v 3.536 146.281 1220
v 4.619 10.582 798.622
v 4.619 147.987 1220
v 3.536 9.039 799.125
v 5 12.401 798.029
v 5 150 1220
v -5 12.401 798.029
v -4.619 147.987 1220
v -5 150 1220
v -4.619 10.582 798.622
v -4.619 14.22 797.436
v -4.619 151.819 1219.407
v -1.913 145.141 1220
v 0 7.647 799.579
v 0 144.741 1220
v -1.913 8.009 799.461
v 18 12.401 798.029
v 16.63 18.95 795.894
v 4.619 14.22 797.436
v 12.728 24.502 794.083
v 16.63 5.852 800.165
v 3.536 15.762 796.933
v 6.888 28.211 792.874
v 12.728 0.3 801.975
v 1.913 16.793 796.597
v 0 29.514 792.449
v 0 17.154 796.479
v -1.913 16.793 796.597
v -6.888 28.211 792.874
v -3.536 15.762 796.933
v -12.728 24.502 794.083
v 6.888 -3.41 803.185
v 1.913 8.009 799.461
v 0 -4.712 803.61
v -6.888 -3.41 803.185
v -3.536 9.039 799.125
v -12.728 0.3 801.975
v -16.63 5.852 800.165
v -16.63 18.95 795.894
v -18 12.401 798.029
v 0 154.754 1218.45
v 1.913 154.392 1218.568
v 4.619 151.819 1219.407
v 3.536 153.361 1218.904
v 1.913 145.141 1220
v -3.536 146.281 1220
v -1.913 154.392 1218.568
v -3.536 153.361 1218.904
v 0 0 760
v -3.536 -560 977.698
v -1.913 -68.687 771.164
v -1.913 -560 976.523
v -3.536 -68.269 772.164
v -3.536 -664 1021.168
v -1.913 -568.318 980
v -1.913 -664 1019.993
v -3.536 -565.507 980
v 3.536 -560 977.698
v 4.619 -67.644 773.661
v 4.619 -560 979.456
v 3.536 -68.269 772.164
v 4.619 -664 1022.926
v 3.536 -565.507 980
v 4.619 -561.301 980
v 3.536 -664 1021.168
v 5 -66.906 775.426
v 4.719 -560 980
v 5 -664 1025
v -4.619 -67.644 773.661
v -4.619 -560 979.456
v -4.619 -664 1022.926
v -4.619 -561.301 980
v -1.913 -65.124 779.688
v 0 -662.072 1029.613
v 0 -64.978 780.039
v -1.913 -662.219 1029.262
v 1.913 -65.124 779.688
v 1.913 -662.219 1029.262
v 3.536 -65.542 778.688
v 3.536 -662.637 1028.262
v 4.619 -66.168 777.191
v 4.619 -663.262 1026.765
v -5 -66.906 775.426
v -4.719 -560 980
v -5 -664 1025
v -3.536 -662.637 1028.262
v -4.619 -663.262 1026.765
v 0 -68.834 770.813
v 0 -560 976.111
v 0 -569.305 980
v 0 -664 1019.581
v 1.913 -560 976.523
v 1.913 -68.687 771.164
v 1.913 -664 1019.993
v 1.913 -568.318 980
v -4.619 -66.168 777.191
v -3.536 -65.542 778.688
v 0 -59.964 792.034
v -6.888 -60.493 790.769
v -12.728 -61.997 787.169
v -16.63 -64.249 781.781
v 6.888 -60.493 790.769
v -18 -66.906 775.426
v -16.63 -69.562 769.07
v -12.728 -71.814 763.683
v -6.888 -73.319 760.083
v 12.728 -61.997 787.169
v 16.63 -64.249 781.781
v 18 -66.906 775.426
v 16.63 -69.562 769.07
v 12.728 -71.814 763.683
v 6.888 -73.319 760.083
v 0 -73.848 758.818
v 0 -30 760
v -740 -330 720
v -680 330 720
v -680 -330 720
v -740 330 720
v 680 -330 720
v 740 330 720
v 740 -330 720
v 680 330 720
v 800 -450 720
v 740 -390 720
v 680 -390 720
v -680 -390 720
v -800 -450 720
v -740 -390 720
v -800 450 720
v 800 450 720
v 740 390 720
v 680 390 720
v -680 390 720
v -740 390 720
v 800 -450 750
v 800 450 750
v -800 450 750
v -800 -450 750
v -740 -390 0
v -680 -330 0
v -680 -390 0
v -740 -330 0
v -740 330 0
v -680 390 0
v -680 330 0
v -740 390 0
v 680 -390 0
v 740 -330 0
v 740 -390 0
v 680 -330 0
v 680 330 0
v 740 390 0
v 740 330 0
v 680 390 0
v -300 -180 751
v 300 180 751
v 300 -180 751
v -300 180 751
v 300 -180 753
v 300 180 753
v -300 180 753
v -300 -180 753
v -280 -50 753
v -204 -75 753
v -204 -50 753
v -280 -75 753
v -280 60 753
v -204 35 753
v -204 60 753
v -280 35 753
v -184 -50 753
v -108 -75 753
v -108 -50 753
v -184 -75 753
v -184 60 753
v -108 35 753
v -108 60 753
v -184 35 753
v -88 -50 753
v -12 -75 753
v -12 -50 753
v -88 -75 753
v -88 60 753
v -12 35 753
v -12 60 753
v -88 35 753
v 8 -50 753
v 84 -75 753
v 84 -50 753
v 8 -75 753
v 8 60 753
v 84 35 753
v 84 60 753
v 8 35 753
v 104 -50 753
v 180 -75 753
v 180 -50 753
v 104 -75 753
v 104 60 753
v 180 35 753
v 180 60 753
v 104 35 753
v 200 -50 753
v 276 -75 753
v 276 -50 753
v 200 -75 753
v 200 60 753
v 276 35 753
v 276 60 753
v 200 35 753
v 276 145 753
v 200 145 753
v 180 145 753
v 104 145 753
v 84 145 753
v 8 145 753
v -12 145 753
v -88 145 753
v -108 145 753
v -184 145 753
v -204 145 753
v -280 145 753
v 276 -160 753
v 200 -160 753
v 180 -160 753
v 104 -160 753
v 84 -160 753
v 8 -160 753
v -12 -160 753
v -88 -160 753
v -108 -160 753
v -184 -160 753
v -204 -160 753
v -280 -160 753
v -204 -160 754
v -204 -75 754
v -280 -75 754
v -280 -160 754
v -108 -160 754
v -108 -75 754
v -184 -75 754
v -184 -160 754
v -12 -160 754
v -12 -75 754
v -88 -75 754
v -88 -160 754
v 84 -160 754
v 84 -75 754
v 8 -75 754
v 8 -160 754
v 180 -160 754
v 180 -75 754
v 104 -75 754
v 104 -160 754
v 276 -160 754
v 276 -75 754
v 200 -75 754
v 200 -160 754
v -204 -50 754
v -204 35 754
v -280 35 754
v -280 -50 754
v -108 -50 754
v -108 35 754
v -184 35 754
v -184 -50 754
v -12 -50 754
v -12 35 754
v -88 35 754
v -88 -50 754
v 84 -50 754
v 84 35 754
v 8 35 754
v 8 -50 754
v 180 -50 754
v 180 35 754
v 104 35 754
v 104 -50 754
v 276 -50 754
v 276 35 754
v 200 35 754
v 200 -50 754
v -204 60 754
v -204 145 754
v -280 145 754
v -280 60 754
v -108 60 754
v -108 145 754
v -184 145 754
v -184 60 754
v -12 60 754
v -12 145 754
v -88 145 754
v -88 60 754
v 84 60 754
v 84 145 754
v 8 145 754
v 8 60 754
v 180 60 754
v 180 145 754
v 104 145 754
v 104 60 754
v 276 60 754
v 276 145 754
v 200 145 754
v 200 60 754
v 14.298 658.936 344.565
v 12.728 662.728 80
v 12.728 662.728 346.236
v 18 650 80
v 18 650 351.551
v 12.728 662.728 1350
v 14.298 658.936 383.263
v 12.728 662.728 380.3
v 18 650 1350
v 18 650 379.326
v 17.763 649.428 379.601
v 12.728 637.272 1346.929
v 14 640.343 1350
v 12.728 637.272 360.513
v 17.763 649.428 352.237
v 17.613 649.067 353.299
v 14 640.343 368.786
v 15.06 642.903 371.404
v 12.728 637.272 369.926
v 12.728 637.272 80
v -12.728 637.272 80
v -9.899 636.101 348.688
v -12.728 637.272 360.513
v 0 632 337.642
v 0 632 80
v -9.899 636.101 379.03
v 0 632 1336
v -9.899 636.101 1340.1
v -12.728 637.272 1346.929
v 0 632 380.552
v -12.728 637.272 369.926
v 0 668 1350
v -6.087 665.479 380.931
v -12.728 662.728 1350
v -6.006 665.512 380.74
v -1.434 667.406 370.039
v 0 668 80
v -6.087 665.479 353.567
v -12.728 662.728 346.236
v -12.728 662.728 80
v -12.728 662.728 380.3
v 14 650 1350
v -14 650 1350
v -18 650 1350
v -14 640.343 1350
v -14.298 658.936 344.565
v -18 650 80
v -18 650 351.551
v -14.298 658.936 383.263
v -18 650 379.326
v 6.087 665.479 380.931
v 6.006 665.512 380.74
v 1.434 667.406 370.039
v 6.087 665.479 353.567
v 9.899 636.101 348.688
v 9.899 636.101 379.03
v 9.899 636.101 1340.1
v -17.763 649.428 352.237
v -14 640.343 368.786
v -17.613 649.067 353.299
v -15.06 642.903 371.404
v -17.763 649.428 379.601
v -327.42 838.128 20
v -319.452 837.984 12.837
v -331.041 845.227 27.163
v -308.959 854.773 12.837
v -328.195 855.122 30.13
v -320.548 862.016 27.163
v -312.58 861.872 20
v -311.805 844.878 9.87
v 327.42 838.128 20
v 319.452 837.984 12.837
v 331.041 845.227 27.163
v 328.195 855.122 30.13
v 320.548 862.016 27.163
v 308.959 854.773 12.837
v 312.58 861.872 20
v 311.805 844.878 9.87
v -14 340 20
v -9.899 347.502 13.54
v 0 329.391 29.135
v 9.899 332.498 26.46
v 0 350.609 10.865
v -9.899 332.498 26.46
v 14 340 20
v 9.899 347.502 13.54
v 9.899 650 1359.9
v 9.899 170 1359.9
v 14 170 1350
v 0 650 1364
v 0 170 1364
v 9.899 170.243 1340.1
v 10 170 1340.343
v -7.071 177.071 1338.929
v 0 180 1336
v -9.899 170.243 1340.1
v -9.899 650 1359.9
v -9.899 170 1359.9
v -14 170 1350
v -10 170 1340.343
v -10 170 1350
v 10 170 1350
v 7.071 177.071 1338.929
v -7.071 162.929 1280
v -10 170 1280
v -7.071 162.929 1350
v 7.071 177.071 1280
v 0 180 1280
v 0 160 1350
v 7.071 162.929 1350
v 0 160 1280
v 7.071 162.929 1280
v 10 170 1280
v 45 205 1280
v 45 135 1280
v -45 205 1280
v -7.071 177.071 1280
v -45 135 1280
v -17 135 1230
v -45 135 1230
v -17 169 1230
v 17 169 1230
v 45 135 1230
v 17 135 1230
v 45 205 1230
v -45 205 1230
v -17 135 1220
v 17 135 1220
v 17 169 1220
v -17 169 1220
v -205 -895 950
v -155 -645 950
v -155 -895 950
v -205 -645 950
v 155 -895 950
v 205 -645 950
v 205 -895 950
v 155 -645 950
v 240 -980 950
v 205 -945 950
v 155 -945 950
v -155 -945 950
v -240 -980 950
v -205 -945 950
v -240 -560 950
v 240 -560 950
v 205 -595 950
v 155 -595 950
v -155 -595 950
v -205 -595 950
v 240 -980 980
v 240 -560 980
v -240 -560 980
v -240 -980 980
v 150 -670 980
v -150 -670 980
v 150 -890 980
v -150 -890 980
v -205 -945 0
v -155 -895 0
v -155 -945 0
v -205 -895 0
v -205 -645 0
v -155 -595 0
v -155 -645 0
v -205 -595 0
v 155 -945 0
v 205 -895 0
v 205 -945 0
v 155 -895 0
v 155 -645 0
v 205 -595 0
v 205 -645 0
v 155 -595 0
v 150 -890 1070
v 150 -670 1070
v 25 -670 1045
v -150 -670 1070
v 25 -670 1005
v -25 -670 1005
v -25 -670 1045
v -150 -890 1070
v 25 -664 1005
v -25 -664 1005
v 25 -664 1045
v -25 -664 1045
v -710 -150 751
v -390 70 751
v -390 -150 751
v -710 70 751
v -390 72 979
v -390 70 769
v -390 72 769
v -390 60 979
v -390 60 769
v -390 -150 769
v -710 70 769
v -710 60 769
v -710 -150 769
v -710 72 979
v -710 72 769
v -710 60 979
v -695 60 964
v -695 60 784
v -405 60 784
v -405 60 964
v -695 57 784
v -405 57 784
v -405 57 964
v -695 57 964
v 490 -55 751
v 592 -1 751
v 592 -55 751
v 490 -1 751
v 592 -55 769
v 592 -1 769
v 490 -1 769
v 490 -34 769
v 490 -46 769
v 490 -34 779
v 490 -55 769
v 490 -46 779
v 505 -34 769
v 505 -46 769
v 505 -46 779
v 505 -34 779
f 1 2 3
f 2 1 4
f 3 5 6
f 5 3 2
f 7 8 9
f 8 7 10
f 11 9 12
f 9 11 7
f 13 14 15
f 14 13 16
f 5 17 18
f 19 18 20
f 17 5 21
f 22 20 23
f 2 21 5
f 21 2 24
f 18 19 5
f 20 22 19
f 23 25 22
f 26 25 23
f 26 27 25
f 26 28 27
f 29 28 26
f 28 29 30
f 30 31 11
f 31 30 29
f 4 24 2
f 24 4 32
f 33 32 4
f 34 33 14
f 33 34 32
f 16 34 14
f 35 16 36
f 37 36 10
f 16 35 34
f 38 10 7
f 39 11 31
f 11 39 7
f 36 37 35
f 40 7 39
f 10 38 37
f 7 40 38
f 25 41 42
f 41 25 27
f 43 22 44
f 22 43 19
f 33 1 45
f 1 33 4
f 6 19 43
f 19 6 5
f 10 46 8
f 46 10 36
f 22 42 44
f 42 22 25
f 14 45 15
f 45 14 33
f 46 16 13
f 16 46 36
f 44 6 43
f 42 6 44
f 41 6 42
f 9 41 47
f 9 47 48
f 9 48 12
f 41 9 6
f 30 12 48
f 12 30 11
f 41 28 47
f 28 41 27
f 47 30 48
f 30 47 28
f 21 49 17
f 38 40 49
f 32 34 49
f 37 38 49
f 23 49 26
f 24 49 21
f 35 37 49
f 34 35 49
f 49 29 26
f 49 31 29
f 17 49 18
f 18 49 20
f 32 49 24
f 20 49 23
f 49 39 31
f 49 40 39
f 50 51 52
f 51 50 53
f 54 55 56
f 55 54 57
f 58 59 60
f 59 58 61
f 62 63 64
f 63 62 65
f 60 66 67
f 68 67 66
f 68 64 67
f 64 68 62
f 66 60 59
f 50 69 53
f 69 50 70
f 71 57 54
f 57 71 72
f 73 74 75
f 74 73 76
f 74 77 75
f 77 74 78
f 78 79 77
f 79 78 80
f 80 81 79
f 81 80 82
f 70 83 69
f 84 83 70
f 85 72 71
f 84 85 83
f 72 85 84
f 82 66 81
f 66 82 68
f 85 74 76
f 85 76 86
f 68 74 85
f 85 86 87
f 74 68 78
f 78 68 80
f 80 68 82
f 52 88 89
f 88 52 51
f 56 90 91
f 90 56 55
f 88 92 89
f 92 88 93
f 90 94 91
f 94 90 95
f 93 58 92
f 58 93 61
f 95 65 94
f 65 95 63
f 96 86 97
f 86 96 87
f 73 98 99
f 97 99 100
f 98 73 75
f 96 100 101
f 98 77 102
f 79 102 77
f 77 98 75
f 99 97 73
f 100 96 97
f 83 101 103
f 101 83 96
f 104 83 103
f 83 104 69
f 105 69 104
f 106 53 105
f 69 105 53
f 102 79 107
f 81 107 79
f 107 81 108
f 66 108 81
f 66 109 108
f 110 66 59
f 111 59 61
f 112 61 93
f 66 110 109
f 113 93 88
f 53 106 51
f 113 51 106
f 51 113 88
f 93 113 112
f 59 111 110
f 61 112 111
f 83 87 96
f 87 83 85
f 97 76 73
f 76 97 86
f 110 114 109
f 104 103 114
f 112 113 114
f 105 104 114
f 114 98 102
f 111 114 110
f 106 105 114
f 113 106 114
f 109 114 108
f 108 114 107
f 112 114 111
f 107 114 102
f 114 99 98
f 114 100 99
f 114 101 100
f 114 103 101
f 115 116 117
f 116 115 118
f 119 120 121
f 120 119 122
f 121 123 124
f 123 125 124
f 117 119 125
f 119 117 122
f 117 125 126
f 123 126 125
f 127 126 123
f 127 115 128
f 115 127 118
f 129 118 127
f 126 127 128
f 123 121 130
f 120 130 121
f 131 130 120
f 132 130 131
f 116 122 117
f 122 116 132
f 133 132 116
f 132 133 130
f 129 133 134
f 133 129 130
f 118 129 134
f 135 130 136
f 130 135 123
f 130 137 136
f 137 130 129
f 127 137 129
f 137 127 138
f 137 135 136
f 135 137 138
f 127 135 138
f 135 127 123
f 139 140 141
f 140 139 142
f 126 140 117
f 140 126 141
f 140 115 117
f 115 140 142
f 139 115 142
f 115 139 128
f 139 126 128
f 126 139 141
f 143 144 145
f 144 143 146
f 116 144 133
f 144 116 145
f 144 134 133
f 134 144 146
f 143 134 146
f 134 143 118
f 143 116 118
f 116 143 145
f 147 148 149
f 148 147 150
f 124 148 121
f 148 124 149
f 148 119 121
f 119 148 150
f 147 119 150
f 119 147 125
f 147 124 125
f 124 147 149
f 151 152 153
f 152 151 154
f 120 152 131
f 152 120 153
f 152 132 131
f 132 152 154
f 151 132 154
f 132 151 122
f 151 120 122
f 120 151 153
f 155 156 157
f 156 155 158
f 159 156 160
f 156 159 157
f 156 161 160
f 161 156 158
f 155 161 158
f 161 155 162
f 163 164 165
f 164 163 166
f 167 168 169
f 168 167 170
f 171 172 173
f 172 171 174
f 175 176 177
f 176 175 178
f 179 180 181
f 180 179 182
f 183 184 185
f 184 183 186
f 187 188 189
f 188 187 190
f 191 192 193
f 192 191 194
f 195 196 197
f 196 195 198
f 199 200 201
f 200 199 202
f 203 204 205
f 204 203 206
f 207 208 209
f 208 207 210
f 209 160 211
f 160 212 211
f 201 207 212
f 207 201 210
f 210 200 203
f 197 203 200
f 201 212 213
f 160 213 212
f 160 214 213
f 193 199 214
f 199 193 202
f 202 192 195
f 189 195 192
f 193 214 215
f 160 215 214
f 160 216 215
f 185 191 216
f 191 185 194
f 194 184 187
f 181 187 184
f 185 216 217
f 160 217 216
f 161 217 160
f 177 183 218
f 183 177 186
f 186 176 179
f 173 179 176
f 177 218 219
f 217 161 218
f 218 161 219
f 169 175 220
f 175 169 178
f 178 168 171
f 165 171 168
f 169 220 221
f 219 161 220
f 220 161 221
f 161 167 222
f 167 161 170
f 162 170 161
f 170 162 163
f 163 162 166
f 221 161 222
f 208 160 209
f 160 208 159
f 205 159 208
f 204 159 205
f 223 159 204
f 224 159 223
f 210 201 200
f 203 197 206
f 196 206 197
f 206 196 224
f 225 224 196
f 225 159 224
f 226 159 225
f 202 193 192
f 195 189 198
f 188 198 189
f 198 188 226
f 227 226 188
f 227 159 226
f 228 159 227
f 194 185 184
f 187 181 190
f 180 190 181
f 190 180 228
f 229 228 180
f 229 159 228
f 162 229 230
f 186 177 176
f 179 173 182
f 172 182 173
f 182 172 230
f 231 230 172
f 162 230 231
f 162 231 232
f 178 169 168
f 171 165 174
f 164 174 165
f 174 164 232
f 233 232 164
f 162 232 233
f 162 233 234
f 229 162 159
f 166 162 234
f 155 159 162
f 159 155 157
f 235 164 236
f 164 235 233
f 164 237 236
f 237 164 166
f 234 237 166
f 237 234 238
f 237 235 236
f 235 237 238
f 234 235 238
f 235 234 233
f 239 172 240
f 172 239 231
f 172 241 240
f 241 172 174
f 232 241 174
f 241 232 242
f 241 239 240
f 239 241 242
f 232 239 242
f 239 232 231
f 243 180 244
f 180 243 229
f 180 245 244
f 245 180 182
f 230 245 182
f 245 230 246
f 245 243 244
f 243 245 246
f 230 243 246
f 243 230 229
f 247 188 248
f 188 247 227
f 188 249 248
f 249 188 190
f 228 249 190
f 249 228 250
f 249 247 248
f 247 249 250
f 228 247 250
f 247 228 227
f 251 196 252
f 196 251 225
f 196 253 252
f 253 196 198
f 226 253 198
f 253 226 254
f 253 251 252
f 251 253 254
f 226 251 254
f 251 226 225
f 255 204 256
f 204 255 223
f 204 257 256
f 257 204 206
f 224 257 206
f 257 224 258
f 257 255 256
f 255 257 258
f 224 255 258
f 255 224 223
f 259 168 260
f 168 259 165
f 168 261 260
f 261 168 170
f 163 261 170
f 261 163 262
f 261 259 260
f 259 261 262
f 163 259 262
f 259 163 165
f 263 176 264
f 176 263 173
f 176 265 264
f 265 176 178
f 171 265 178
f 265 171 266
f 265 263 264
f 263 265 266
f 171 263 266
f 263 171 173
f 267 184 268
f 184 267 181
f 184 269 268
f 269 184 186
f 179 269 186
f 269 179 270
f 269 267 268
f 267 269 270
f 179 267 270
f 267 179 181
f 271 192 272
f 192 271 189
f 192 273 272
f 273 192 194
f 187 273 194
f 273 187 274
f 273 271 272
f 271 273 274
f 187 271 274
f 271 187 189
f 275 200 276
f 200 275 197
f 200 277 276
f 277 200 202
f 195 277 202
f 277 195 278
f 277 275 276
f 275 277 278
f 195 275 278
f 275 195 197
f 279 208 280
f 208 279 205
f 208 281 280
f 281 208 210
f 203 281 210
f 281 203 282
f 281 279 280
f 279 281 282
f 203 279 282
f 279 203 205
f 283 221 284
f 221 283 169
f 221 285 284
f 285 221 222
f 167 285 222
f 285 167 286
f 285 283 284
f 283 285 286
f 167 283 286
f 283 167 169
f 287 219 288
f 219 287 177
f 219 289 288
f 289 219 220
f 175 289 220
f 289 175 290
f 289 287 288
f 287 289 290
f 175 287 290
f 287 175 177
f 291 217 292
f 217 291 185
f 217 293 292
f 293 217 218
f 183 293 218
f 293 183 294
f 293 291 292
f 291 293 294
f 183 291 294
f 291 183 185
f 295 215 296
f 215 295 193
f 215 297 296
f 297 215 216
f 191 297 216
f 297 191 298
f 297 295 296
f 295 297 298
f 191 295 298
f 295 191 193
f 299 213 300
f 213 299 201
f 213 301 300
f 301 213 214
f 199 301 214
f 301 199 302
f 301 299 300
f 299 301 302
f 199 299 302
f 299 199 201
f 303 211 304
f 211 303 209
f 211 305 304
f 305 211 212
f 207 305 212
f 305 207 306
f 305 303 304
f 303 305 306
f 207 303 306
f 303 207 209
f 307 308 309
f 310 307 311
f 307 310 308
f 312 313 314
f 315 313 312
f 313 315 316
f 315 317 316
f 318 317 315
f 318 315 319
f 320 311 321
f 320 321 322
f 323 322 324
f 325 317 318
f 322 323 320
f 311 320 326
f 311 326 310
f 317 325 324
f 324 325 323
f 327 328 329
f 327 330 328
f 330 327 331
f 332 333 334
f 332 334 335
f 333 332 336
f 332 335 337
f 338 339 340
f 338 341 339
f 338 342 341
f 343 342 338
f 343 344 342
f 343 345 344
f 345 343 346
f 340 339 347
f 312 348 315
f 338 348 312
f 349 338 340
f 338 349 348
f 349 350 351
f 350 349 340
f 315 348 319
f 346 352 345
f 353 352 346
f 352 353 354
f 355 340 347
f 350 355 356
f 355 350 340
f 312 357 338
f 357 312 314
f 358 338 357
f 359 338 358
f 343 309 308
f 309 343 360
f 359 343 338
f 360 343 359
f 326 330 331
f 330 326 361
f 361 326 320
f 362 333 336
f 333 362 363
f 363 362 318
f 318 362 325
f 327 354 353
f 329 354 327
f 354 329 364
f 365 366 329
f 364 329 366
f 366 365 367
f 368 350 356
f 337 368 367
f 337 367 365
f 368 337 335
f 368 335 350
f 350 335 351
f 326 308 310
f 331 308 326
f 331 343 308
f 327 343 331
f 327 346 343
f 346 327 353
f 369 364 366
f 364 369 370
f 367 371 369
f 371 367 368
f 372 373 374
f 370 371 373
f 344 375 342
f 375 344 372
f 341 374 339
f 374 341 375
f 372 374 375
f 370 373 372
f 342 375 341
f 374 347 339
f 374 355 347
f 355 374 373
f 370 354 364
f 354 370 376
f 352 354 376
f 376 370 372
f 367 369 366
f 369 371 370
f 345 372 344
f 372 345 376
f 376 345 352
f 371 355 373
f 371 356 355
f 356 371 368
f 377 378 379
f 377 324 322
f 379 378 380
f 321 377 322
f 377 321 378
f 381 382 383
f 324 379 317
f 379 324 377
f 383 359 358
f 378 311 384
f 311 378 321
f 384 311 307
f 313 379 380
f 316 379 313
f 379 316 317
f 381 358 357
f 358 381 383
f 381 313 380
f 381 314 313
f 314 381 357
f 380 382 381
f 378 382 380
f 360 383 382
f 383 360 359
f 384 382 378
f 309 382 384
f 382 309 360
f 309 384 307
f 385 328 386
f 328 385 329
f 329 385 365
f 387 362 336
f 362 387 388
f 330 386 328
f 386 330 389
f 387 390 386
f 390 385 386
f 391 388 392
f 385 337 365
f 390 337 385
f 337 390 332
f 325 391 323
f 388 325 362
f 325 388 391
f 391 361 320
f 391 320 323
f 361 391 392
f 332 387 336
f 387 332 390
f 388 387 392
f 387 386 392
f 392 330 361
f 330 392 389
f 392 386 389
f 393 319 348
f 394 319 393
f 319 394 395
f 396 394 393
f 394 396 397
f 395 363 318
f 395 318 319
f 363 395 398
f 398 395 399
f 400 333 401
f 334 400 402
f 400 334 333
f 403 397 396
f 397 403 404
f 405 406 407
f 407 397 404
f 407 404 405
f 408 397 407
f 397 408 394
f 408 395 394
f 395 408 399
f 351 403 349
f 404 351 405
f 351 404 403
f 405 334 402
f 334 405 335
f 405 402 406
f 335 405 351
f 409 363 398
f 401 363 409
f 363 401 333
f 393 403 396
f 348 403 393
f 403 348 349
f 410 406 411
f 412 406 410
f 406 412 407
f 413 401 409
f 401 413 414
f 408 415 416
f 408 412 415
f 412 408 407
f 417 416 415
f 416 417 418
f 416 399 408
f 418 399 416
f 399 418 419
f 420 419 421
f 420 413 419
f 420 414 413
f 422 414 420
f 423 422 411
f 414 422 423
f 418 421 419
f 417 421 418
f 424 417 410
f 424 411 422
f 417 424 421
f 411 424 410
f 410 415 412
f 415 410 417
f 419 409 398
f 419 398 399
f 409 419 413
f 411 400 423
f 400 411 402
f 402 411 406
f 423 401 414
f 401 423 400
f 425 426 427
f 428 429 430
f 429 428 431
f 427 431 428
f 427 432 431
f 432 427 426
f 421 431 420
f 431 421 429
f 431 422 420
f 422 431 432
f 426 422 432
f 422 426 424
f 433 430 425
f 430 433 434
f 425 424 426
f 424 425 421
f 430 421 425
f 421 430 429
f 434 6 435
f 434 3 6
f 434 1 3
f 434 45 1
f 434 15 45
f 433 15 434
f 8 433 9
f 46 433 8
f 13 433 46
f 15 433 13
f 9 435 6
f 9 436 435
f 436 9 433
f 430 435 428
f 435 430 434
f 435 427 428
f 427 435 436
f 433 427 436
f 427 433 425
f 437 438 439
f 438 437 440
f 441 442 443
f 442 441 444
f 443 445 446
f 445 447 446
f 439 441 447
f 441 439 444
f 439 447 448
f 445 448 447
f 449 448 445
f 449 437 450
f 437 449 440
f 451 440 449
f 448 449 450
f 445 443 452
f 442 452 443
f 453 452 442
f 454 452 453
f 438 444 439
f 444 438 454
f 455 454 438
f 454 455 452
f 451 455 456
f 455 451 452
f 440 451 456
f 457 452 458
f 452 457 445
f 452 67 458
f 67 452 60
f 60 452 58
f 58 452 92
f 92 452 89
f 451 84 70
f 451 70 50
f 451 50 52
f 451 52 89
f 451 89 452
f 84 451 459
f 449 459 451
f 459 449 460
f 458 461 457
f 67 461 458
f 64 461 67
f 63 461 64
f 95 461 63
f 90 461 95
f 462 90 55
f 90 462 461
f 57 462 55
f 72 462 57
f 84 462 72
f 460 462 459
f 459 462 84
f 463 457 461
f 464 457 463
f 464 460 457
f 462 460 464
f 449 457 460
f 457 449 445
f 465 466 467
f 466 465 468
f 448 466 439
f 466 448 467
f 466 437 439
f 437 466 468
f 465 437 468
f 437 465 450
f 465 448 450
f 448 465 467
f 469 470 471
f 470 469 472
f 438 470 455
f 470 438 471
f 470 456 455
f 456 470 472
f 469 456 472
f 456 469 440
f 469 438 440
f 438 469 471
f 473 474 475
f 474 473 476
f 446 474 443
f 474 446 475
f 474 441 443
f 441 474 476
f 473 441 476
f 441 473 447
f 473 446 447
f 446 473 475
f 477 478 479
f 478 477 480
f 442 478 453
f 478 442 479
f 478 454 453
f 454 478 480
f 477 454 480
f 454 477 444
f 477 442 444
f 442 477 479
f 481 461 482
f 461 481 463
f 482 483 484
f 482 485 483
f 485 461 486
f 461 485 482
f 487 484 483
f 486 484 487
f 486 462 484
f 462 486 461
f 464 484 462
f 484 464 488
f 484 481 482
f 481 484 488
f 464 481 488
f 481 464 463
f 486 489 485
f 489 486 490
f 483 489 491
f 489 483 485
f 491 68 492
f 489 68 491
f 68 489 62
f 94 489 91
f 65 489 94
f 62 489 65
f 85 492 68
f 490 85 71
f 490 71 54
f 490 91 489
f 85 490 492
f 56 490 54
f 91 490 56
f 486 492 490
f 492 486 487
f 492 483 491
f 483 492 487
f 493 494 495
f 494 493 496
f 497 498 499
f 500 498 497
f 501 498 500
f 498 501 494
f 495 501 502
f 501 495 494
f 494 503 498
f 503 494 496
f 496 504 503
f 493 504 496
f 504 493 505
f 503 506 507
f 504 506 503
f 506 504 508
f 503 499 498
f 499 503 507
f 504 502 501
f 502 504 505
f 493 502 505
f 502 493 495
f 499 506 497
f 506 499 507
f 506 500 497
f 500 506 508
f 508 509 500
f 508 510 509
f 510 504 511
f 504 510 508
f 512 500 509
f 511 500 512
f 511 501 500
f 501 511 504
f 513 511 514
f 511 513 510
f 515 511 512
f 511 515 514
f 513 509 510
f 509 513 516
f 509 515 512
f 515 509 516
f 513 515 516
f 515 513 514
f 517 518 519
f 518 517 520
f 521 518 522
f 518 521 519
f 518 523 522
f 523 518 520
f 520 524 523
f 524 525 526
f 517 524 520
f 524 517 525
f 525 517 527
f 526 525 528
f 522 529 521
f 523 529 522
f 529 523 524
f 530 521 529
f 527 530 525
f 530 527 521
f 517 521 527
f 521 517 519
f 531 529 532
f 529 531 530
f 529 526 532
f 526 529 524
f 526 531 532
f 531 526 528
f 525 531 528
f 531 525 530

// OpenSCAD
// Concept CAD — Not Built or Validated
// Units: approximate mm. Presentation only; no manufacturing or mounting data.
// Generated with generate-concept.cjs; editable independently in OpenSCAD.
// Existing desk, standard overhead stand, existing projector support.
// No cables, physical interfaces, optical calibration, loads or clearances validated.
show_directions = true;
show_interaction_tiles = true;

// Existing desk placeholder
color([0.7372549019607844,0.6392156862745098,0.5450980392156862]) polyhedron(points=[[-800,-450,720],[800,-450,720],[800,450,720],[-800,450,720],[-800,-450,750],[800,-450,750],[800,450,750],[-800,450,750]], faces=[[1,2,3,0],[7,6,5,4],[4,5,1,0],[5,6,2,1],[6,7,3,2],[7,4,0,3]], convexity=10);

// Existing desk leg
color([0.7372549019607844,0.6392156862745098,0.5450980392156862]) polyhedron(points=[[-740,-390,0],[-680,-390,0],[-680,-330,0],[-740,-330,0],[-740,-390,720],[-680,-390,720],[-680,-330,720],[-740,-330,720]], faces=[[1,2,3,0],[7,6,5,4],[4,5,1,0],[5,6,2,1],[6,7,3,2],[7,4,0,3]], convexity=10);

// Existing desk leg
color([0.7372549019607844,0.6392156862745098,0.5450980392156862]) polyhedron(points=[[-740,330,0],[-680,330,0],[-680,390,0],[-740,390,0],[-740,330,720],[-680,330,720],[-680,390,720],[-740,390,720]], faces=[[1,2,3,0],[7,6,5,4],[4,5,1,0],[5,6,2,1],[6,7,3,2],[7,4,0,3]], convexity=10);

// Existing desk leg
color([0.7372549019607844,0.6392156862745098,0.5450980392156862]) polyhedron(points=[[680,-390,0],[740,-390,0],[740,-330,0],[680,-330,0],[680,-390,720],[740,-390,720],[740,-330,720],[680,-330,720]], faces=[[1,2,3,0],[7,6,5,4],[4,5,1,0],[5,6,2,1],[6,7,3,2],[7,4,0,3]], convexity=10);

// Existing desk leg
color([0.7372549019607844,0.6392156862745098,0.5450980392156862]) polyhedron(points=[[680,330,0],[740,330,0],[740,390,0],[680,390,0],[680,330,720],[740,330,720],[740,390,720],[680,390,720]], faces=[[1,2,3,0],[7,6,5,4],[4,5,1,0],[5,6,2,1],[6,7,3,2],[7,4,0,3]], convexity=10);

// Projected interaction area
color([0.8823529411764706,0.7411764705882353,0.28627450980392155]) polyhedron(points=[[-300,-180,751],[300,-180,751],[300,180,751],[-300,180,751],[-300,-180,753],[300,-180,753],[300,180,753],[-300,180,753]], faces=[[1,2,3,0],[7,6,5,4],[4,5,1,0],[5,6,2,1],[6,7,3,2],[7,4,0,3]], convexity=10);

// Illustrative projected card
if (show_interaction_tiles) color([0.9725490196078431,0.9294117647058824,0.7686274509803922]) polyhedron(points=[[-280,-160,753],[-204,-160,753],[-204,-75,753],[-280,-75,753],[-280,-160,754],[-204,-160,754],[-204,-75,754],[-280,-75,754]], faces=[[1,2,3,0],[7,6,5,4],[4,5,1,0],[5,6,2,1],[6,7,3,2],[7,4,0,3]], convexity=10);

// Illustrative projected card
if (show_interaction_tiles) color([0.9725490196078431,0.9294117647058824,0.7686274509803922]) polyhedron(points=[[-184,-160,753],[-108,-160,753],[-108,-75,753],[-184,-75,753],[-184,-160,754],[-108,-160,754],[-108,-75,754],[-184,-75,754]], faces=[[1,2,3,0],[7,6,5,4],[4,5,1,0],[5,6,2,1],[6,7,3,2],[7,4,0,3]], convexity=10);

// Illustrative projected card
if (show_interaction_tiles) color([0.9725490196078431,0.9294117647058824,0.7686274509803922]) polyhedron(points=[[-88,-160,753],[-12,-160,753],[-12,-75,753],[-88,-75,753],[-88,-160,754],[-12,-160,754],[-12,-75,754],[-88,-75,754]], faces=[[1,2,3,0],[7,6,5,4],[4,5,1,0],[5,6,2,1],[6,7,3,2],[7,4,0,3]], convexity=10);

// Illustrative projected card
if (show_interaction_tiles) color([0.9725490196078431,0.9294117647058824,0.7686274509803922]) polyhedron(points=[[8,-160,753],[84,-160,753],[84,-75,753],[8,-75,753],[8,-160,754],[84,-160,754],[84,-75,754],[8,-75,754]], faces=[[1,2,3,0],[7,6,5,4],[4,5,1,0],[5,6,2,1],[6,7,3,2],[7,4,0,3]], convexity=10);

// Illustrative projected card
if (show_interaction_tiles) color([0.9725490196078431,0.9294117647058824,0.7686274509803922]) polyhedron(points=[[104,-160,753],[180,-160,753],[180,-75,753],[104,-75,753],[104,-160,754],[180,-160,754],[180,-75,754],[104,-75,754]], faces=[[1,2,3,0],[7,6,5,4],[4,5,1,0],[5,6,2,1],[6,7,3,2],[7,4,0,3]], convexity=10);

// Illustrative projected card
if (show_interaction_tiles) color([0.9725490196078431,0.9294117647058824,0.7686274509803922]) polyhedron(points=[[200,-160,753],[276,-160,753],[276,-75,753],[200,-75,753],[200,-160,754],[276,-160,754],[276,-75,754],[200,-75,754]], faces=[[1,2,3,0],[7,6,5,4],[4,5,1,0],[5,6,2,1],[6,7,3,2],[7,4,0,3]], convexity=10);

// Illustrative projected card
if (show_interaction_tiles) color([0.9725490196078431,0.9294117647058824,0.7686274509803922]) polyhedron(points=[[-280,-50,753],[-204,-50,753],[-204,35,753],[-280,35,753],[-280,-50,754],[-204,-50,754],[-204,35,754],[-280,35,754]], faces=[[1,2,3,0],[7,6,5,4],[4,5,1,0],[5,6,2,1],[6,7,3,2],[7,4,0,3]], convexity=10);

// Illustrative projected card
if (show_interaction_tiles) color([0.9725490196078431,0.9294117647058824,0.7686274509803922]) polyhedron(points=[[-184,-50,753],[-108,-50,753],[-108,35,753],[-184,35,753],[-184,-50,754],[-108,-50,754],[-108,35,754],[-184,35,754]], faces=[[1,2,3,0],[7,6,5,4],[4,5,1,0],[5,6,2,1],[6,7,3,2],[7,4,0,3]], convexity=10);

// Illustrative projected card
if (show_interaction_tiles) color([0.9725490196078431,0.9294117647058824,0.7686274509803922]) polyhedron(points=[[-88,-50,753],[-12,-50,753],[-12,35,753],[-88,35,753],[-88,-50,754],[-12,-50,754],[-12,35,754],[-88,35,754]], faces=[[1,2,3,0],[7,6,5,4],[4,5,1,0],[5,6,2,1],[6,7,3,2],[7,4,0,3]], convexity=10);

// Illustrative projected card
if (show_interaction_tiles) color([0.9725490196078431,0.9294117647058824,0.7686274509803922]) polyhedron(points=[[8,-50,753],[84,-50,753],[84,35,753],[8,35,753],[8,-50,754],[84,-50,754],[84,35,754],[8,35,754]], faces=[[1,2,3,0],[7,6,5,4],[4,5,1,0],[5,6,2,1],[6,7,3,2],[7,4,0,3]], convexity=10);

// Illustrative projected card
if (show_interaction_tiles) color([0.9725490196078431,0.9294117647058824,0.7686274509803922]) polyhedron(points=[[104,-50,753],[180,-50,753],[180,35,753],[104,35,753],[104,-50,754],[180,-50,754],[180,35,754],[104,35,754]], faces=[[1,2,3,0],[7,6,5,4],[4,5,1,0],[5,6,2,1],[6,7,3,2],[7,4,0,3]], convexity=10);

// Illustrative projected card
if (show_interaction_tiles) color([0.9725490196078431,0.9294117647058824,0.7686274509803922]) polyhedron(points=[[200,-50,753],[276,-50,753],[276,35,753],[200,35,753],[200,-50,754],[276,-50,754],[276,35,754],[200,35,754]], faces=[[1,2,3,0],[7,6,5,4],[4,5,1,0],[5,6,2,1],[6,7,3,2],[7,4,0,3]], convexity=10);

// Illustrative projected card
if (show_interaction_tiles) color([0.9725490196078431,0.9294117647058824,0.7686274509803922]) polyhedron(points=[[-280,60,753],[-204,60,753],[-204,145,753],[-280,145,753],[-280,60,754],[-204,60,754],[-204,145,754],[-280,145,754]], faces=[[1,2,3,0],[7,6,5,4],[4,5,1,0],[5,6,2,1],[6,7,3,2],[7,4,0,3]], convexity=10);

// Illustrative projected card
if (show_interaction_tiles) color([0.9725490196078431,0.9294117647058824,0.7686274509803922]) polyhedron(points=[[-184,60,753],[-108,60,753],[-108,145,753],[-184,145,753],[-184,60,754],[-108,60,754],[-108,145,754],[-184,145,754]], faces=[[1,2,3,0],[7,6,5,4],[4,5,1,0],[5,6,2,1],[6,7,3,2],[7,4,0,3]], convexity=10);

// Illustrative projected card
if (show_interaction_tiles) color([0.9725490196078431,0.9294117647058824,0.7686274509803922]) polyhedron(points=[[-88,60,753],[-12,60,753],[-12,145,753],[-88,145,753],[-88,60,754],[-12,60,754],[-12,145,754],[-88,145,754]], faces=[[1,2,3,0],[7,6,5,4],[4,5,1,0],[5,6,2,1],[6,7,3,2],[7,4,0,3]], convexity=10);

// Illustrative projected card
if (show_interaction_tiles) color([0.9725490196078431,0.9294117647058824,0.7686274509803922]) polyhedron(points=[[8,60,753],[84,60,753],[84,145,753],[8,145,753],[8,60,754],[84,60,754],[84,145,754],[8,145,754]], faces=[[1,2,3,0],[7,6,5,4],[4,5,1,0],[5,6,2,1],[6,7,3,2],[7,4,0,3]], convexity=10);

// Illustrative projected card
if (show_interaction_tiles) color([0.9725490196078431,0.9294117647058824,0.7686274509803922]) polyhedron(points=[[104,60,753],[180,60,753],[180,145,753],[104,145,753],[104,60,754],[180,60,754],[180,145,754],[104,145,754]], faces=[[1,2,3,0],[7,6,5,4],[4,5,1,0],[5,6,2,1],[6,7,3,2],[7,4,0,3]], convexity=10);

// Illustrative projected card
if (show_interaction_tiles) color([0.9725490196078431,0.9294117647058824,0.7686274509803922]) polyhedron(points=[[200,60,753],[276,60,753],[276,145,753],[200,145,753],[200,60,754],[276,60,754],[276,145,754],[200,145,754]], faces=[[1,2,3,0],[7,6,5,4],[4,5,1,0],[5,6,2,1],[6,7,3,2],[7,4,0,3]], convexity=10);

// Standard stand mast
color([0.3254901960784314,0.39215686274509803,0.4666666666666667]) polyhedron(points=[[-18,650,80],[-12.727922061357857,637.2720779386422,80],[-1.102182119232618e-15,632,80],[12.727922061357855,637.2720779386422,80],[18,650,80],[12.727922061357859,662.7279220613578,80],[3.3065463576978533e-15,668,80],[-12.727922061357852,662.7279220613578,80],[-18,650,1350],[-12.727922061357857,637.2720779386422,1350],[-1.102182119232618e-15,632,1350],[12.727922061357855,637.2720779386422,1350],[18,650,1350],[12.727922061357859,662.7279220613578,1350],[3.3065463576978533e-15,668,1350],[-12.727922061357852,662.7279220613578,1350]], faces=[[0,1,2,3,4,5,6,7],[15,14,13,12,11,10,9,8],[8,9,1,0],[9,10,2,1],[10,11,3,2],[11,12,4,3],[12,13,5,4],[13,14,6,5],[14,15,7,6],[15,8,0,7]], convexity=10);

// Standard tripod leg
color([0.3254901960784314,0.39215686274509803,0.4666666666666667]) polyhedron(points=[[7.41998516004452,661.8719762560712,380],[11.041356622964965,654.7731081667574,372.8371875388964],[8.194851123150528,644.8782180480309,369.8702534727723],[0.5479129770229045,637.9835983332501,372.8371875388964],[-7.419985160044519,638.1280237439288,380],[-11.041356622964965,645.2268918332426,387.1628124611036],[-8.19485112315053,655.1217819519691,390.1297465272277],[-0.5479129770229061,662.0164016667499,387.1628124611036],[-312.5800148399555,861.8719762560712,20],[-308.95864337703506,854.7731081667574,12.837187538896387],[-311.80514887684944,844.8782180480309,9.870253472772264],[-319.4520870229771,837.9835983332501,12.837187538896387],[-327.4199851600445,838.1280237439288,20],[-331.04135662296494,845.2268918332426,27.162812461103613],[-328.19485112315056,855.1217819519691,30.129746527227738],[-320.5479129770229,862.0164016667499,27.162812461103613]], faces=[[0,1,2,3,4,5,6,7],[15,14,13,12,11,10,9,8],[8,9,1,0],[9,10,2,1],[10,11,3,2],[11,12,4,3],[12,13,5,4],[13,14,6,5],[14,15,7,6],[15,8,0,7]], convexity=10);

// Standard tripod leg
color([0.3254901960784314,0.39215686274509803,0.4666666666666667]) polyhedron(points=[[7.41998516004452,638.1280237439288,380],[-0.547912977022903,637.9835983332501,372.8371875388964],[-8.194851123150528,644.8782180480309,369.8702534727723],[-11.041356622964965,654.7731081667574,372.8371875388964],[-7.419985160044522,661.8719762560712,380],[0.5479129770229022,662.0164016667499,387.1628124611036],[8.194851123150528,655.1217819519691,390.1297465272277],[11.041356622964965,645.2268918332426,387.1628124611036],[327.4199851600445,838.1280237439288,20],[319.4520870229771,837.9835983332501,12.837187538896387],[311.80514887684944,844.8782180480309,9.870253472772264],[308.95864337703506,854.7731081667574,12.837187538896387],[312.5800148399555,861.8719762560712,20],[320.5479129770229,862.0164016667499,27.162812461103613],[328.19485112315056,855.1217819519691,30.129746527227738],[331.04135662296494,845.2268918332426,27.162812461103613]], faces=[[0,1,2,3,4,5,6,7],[15,14,13,12,11,10,9,8],[8,9,1,0],[9,10,2,1],[10,11,3,2],[11,12,4,3],[12,13,5,4],[13,14,6,5],[14,15,7,6],[15,8,0,7]], convexity=10);

// Standard tripod leg
color([0.3254901960784314,0.39215686274509803,0.4666666666666667]) polyhedron(points=[[-14,650,380],[-9.899494936611665,657.5015284220199,373.54035052548295],[-8.572527594031472e-16,660.6087632329477,370.86467610496175],[9.899494936611664,657.5015284220199,373.54035052548295],[14,650,380],[9.899494936611667,642.4984715779801,386.45964947451705],[2.5717582782094417e-15,639.3912367670523,389.13532389503825],[-9.899494936611664,642.4984715779801,386.45964947451705],[-14,340,20],[-9.899494936611665,347.5015284220198,13.540350525482925],[-8.572527594031472e-16,350.6087632329477,10.864676104961717],[9.899494936611664,347.5015284220198,13.540350525482925],[14,340,20],[9.899494936611667,332.4984715779802,26.459649474517075],[2.5717582782094417e-15,329.3912367670523,29.135323895038283],[-9.899494936611664,332.4984715779802,26.459649474517075]], faces=[[0,1,2,3,4,5,6,7],[15,14,13,12,11,10,9,8],[8,9,1,0],[9,10,2,1],[10,11,3,2],[11,12,4,3],[12,13,5,4],[13,14,6,5],[14,15,7,6],[15,8,0,7]], convexity=10);

// Existing overhead stand arm
color([0.3254901960784314,0.39215686274509803,0.4666666666666667]) polyhedron(points=[[-14,650,1350],[-9.899494936611665,650,1340.1005050633883],[-8.572527594031472e-16,650,1336],[9.899494936611664,650,1340.1005050633883],[14,650,1350],[9.899494936611667,650,1359.8994949366117],[2.5717582782094417e-15,650,1364],[-9.899494936611664,650,1359.8994949366117],[-14,170,1350],[-9.899494936611665,170,1340.1005050633883],[-8.572527594031472e-16,170,1336],[9.899494936611664,170,1340.1005050633883],[14,170,1350],[9.899494936611667,170,1359.8994949366117],[2.5717582782094417e-15,170,1364],[-9.899494936611664,170,1359.8994949366117]], faces=[[0,1,2,3,4,5,6,7],[15,14,13,12,11,10,9,8],[8,9,1,0],[9,10,2,1],[10,11,3,2],[11,12,4,3],[12,13,5,4],[13,14,6,5],[14,15,7,6],[15,8,0,7]], convexity=10);

// Concept camera connection
color([0.3254901960784314,0.39215686274509803,0.4666666666666667]) polyhedron(points=[[10,170,1350],[7.0710678118654755,162.92893218813452,1350],[6.123233995736766e-16,160,1350],[-7.071067811865475,162.92893218813452,1350],[-10,170,1350],[-7.071067811865477,177.07106781186548,1350],[-1.8369701987210296e-15,180,1350],[7.071067811865474,177.07106781186548,1350],[10,170,1280],[7.0710678118654755,162.92893218813452,1280],[6.123233995736766e-16,160,1280],[-7.071067811865475,162.92893218813452,1280],[-10,170,1280],[-7.071067811865477,177.07106781186548,1280],[-1.8369701987210296e-15,180,1280],[7.071067811865474,177.07106781186548,1280]], faces=[[0,1,2,3,4,5,6,7],[15,14,13,12,11,10,9,8],[8,9,1,0],[9,10,2,1],[10,11,3,2],[11,12,4,3],[12,13,5,4],[13,14,6,5],[14,15,7,6],[15,8,0,7]], convexity=10);

// USB webcam placeholder
color([0.2,0.6627450980392157,0.7372549019607844]) polyhedron(points=[[-45,135,1230],[45,135,1230],[45,205,1230],[-45,205,1230],[-45,135,1280],[45,135,1280],[45,205,1280],[-45,205,1280]], faces=[[1,2,3,0],[7,6,5,4],[4,5,1,0],[5,6,2,1],[6,7,3,2],[7,4,0,3]], convexity=10);

// Webcam lens marker
color([0.09019607843137255,0.2196078431372549,0.27450980392156865]) polyhedron(points=[[-17,135,1220],[17,135,1220],[17,169,1220],[-17,169,1220],[-17,135,1230],[17,135,1230],[17,169,1230],[-17,169,1230]], faces=[[1,2,3,0],[7,6,5,4],[4,5,1,0],[5,6,2,1],[6,7,3,2],[7,4,0,3]], convexity=10);

// Existing stable support top
color([0.7215686274509804,0.7450980392156863,0.7764705882352941]) polyhedron(points=[[-240,-980,950],[240,-980,950],[240,-560,950],[-240,-560,950],[-240,-980,980],[240,-980,980],[240,-560,980],[-240,-560,980]], faces=[[1,2,3,0],[7,6,5,4],[4,5,1,0],[5,6,2,1],[6,7,3,2],[7,4,0,3]], convexity=10);

// Existing support leg
color([0.7215686274509804,0.7450980392156863,0.7764705882352941]) polyhedron(points=[[-205,-945,0],[-155,-945,0],[-155,-895,0],[-205,-895,0],[-205,-945,950],[-155,-945,950],[-155,-895,950],[-205,-895,950]], faces=[[1,2,3,0],[7,6,5,4],[4,5,1,0],[5,6,2,1],[6,7,3,2],[7,4,0,3]], convexity=10);

// Existing support leg
color([0.7215686274509804,0.7450980392156863,0.7764705882352941]) polyhedron(points=[[-205,-645,0],[-155,-645,0],[-155,-595,0],[-205,-595,0],[-205,-645,950],[-155,-645,950],[-155,-595,950],[-205,-595,950]], faces=[[1,2,3,0],[7,6,5,4],[4,5,1,0],[5,6,2,1],[6,7,3,2],[7,4,0,3]], convexity=10);

// Existing support leg
color([0.7215686274509804,0.7450980392156863,0.7764705882352941]) polyhedron(points=[[155,-945,0],[205,-945,0],[205,-895,0],[155,-895,0],[155,-945,950],[205,-945,950],[205,-895,950],[155,-895,950]], faces=[[1,2,3,0],[7,6,5,4],[4,5,1,0],[5,6,2,1],[6,7,3,2],[7,4,0,3]], convexity=10);

// Existing support leg
color([0.7215686274509804,0.7450980392156863,0.7764705882352941]) polyhedron(points=[[155,-645,0],[205,-645,0],[205,-595,0],[155,-595,0],[155,-645,950],[205,-645,950],[205,-595,950],[155,-595,950]], faces=[[1,2,3,0],[7,6,5,4],[4,5,1,0],[5,6,2,1],[6,7,3,2],[7,4,0,3]], convexity=10);

// Portable projector placeholder
color([0.5215686274509804,0.4117647058823529,0.7411764705882353]) polyhedron(points=[[-150,-890,980],[150,-890,980],[150,-670,980],[-150,-670,980],[-150,-890,1070],[150,-890,1070],[150,-670,1070],[-150,-670,1070]], faces=[[1,2,3,0],[7,6,5,4],[4,5,1,0],[5,6,2,1],[6,7,3,2],[7,4,0,3]], convexity=10);

// Projector lens marker
color([0.19215686274509805,0.1450980392156863,0.2549019607843137]) polyhedron(points=[[-25,-672,1005],[25,-672,1005],[25,-664,1005],[-25,-664,1005],[-25,-672,1045],[25,-672,1045],[25,-664,1045],[-25,-664,1045]], faces=[[1,2,3,0],[7,6,5,4],[4,5,1,0],[5,6,2,1],[6,7,3,2],[7,4,0,3]], convexity=10);

// Laptop base
color([0.2784313725490196,0.43529411764705883,0.6901960784313725]) polyhedron(points=[[-710,-150,751],[-390,-150,751],[-390,70,751],[-710,70,751],[-710,-150,769],[-390,-150,769],[-390,70,769],[-710,70,769]], faces=[[1,2,3,0],[7,6,5,4],[4,5,1,0],[5,6,2,1],[6,7,3,2],[7,4,0,3]], convexity=10);

// Laptop display placeholder
color([0.2784313725490196,0.43529411764705883,0.6901960784313725]) polyhedron(points=[[-710,60,769],[-390,60,769],[-390,72,769],[-710,72,769],[-710,60,979],[-390,60,979],[-390,72,979],[-710,72,979]], faces=[[1,2,3,0],[7,6,5,4],[4,5,1,0],[5,6,2,1],[6,7,3,2],[7,4,0,3]], convexity=10);

// Laptop screen
color([0.8431372549019608,0.9019607843137255,0.9647058823529412]) polyhedron(points=[[-695,57,784],[-405,57,784],[-405,60,784],[-695,60,784],[-695,57,964],[-405,57,964],[-405,60,964],[-695,60,964]], faces=[[1,2,3,0],[7,6,5,4],[4,5,1,0],[5,6,2,1],[6,7,3,2],[7,4,0,3]], convexity=10);

// Mega 2560 envelope
color([0.21176470588235294,0.611764705882353,0.4823529411764706]) polyhedron(points=[[490,-55,751],[592,-55,751],[592,-1,751],[490,-1,751],[490,-55,769],[592,-55,769],[592,-1,769],[490,-1,769]], faces=[[1,2,3,0],[7,6,5,4],[4,5,1,0],[5,6,2,1],[6,7,3,2],[7,4,0,3]], convexity=10);

// Mega USB connector marker
color([0.796078431372549,0.8235294117647058,0.8470588235294118]) polyhedron(points=[[490,-46,769],[505,-46,769],[505,-34,769],[490,-34,769],[490,-46,779],[505,-46,779],[505,-34,779],[490,-34,779]], faces=[[1,2,3,0],[7,6,5,4],[4,5,1,0],[5,6,2,1],[6,7,3,2],[7,4,0,3]], convexity=10);

module direction(a,b,c) { v=b-a; l=norm(v); color(c) translate(a) rotate(a=acos(v[2]/l),v=[-v[1],v[0],0]) { cylinder(h=l-40,r=5,$fn=16); translate([0,0,l-40]) cylinder(h=40,r1=18,r2=0,$fn=16); } }
if(show_directions) direction([0,150,1220],[0,0,760],[0.1568627450980392,0.6549019607843137,0.7254901960784313]); // Camera viewing direction: endpoint marker is at desk
if(show_directions) direction([0,-664,1025],[0,-30,760],[0.6745098039215687,0.5098039215686274,0.807843137254902]); // Projector beam direction: endpoint marker is at desk
